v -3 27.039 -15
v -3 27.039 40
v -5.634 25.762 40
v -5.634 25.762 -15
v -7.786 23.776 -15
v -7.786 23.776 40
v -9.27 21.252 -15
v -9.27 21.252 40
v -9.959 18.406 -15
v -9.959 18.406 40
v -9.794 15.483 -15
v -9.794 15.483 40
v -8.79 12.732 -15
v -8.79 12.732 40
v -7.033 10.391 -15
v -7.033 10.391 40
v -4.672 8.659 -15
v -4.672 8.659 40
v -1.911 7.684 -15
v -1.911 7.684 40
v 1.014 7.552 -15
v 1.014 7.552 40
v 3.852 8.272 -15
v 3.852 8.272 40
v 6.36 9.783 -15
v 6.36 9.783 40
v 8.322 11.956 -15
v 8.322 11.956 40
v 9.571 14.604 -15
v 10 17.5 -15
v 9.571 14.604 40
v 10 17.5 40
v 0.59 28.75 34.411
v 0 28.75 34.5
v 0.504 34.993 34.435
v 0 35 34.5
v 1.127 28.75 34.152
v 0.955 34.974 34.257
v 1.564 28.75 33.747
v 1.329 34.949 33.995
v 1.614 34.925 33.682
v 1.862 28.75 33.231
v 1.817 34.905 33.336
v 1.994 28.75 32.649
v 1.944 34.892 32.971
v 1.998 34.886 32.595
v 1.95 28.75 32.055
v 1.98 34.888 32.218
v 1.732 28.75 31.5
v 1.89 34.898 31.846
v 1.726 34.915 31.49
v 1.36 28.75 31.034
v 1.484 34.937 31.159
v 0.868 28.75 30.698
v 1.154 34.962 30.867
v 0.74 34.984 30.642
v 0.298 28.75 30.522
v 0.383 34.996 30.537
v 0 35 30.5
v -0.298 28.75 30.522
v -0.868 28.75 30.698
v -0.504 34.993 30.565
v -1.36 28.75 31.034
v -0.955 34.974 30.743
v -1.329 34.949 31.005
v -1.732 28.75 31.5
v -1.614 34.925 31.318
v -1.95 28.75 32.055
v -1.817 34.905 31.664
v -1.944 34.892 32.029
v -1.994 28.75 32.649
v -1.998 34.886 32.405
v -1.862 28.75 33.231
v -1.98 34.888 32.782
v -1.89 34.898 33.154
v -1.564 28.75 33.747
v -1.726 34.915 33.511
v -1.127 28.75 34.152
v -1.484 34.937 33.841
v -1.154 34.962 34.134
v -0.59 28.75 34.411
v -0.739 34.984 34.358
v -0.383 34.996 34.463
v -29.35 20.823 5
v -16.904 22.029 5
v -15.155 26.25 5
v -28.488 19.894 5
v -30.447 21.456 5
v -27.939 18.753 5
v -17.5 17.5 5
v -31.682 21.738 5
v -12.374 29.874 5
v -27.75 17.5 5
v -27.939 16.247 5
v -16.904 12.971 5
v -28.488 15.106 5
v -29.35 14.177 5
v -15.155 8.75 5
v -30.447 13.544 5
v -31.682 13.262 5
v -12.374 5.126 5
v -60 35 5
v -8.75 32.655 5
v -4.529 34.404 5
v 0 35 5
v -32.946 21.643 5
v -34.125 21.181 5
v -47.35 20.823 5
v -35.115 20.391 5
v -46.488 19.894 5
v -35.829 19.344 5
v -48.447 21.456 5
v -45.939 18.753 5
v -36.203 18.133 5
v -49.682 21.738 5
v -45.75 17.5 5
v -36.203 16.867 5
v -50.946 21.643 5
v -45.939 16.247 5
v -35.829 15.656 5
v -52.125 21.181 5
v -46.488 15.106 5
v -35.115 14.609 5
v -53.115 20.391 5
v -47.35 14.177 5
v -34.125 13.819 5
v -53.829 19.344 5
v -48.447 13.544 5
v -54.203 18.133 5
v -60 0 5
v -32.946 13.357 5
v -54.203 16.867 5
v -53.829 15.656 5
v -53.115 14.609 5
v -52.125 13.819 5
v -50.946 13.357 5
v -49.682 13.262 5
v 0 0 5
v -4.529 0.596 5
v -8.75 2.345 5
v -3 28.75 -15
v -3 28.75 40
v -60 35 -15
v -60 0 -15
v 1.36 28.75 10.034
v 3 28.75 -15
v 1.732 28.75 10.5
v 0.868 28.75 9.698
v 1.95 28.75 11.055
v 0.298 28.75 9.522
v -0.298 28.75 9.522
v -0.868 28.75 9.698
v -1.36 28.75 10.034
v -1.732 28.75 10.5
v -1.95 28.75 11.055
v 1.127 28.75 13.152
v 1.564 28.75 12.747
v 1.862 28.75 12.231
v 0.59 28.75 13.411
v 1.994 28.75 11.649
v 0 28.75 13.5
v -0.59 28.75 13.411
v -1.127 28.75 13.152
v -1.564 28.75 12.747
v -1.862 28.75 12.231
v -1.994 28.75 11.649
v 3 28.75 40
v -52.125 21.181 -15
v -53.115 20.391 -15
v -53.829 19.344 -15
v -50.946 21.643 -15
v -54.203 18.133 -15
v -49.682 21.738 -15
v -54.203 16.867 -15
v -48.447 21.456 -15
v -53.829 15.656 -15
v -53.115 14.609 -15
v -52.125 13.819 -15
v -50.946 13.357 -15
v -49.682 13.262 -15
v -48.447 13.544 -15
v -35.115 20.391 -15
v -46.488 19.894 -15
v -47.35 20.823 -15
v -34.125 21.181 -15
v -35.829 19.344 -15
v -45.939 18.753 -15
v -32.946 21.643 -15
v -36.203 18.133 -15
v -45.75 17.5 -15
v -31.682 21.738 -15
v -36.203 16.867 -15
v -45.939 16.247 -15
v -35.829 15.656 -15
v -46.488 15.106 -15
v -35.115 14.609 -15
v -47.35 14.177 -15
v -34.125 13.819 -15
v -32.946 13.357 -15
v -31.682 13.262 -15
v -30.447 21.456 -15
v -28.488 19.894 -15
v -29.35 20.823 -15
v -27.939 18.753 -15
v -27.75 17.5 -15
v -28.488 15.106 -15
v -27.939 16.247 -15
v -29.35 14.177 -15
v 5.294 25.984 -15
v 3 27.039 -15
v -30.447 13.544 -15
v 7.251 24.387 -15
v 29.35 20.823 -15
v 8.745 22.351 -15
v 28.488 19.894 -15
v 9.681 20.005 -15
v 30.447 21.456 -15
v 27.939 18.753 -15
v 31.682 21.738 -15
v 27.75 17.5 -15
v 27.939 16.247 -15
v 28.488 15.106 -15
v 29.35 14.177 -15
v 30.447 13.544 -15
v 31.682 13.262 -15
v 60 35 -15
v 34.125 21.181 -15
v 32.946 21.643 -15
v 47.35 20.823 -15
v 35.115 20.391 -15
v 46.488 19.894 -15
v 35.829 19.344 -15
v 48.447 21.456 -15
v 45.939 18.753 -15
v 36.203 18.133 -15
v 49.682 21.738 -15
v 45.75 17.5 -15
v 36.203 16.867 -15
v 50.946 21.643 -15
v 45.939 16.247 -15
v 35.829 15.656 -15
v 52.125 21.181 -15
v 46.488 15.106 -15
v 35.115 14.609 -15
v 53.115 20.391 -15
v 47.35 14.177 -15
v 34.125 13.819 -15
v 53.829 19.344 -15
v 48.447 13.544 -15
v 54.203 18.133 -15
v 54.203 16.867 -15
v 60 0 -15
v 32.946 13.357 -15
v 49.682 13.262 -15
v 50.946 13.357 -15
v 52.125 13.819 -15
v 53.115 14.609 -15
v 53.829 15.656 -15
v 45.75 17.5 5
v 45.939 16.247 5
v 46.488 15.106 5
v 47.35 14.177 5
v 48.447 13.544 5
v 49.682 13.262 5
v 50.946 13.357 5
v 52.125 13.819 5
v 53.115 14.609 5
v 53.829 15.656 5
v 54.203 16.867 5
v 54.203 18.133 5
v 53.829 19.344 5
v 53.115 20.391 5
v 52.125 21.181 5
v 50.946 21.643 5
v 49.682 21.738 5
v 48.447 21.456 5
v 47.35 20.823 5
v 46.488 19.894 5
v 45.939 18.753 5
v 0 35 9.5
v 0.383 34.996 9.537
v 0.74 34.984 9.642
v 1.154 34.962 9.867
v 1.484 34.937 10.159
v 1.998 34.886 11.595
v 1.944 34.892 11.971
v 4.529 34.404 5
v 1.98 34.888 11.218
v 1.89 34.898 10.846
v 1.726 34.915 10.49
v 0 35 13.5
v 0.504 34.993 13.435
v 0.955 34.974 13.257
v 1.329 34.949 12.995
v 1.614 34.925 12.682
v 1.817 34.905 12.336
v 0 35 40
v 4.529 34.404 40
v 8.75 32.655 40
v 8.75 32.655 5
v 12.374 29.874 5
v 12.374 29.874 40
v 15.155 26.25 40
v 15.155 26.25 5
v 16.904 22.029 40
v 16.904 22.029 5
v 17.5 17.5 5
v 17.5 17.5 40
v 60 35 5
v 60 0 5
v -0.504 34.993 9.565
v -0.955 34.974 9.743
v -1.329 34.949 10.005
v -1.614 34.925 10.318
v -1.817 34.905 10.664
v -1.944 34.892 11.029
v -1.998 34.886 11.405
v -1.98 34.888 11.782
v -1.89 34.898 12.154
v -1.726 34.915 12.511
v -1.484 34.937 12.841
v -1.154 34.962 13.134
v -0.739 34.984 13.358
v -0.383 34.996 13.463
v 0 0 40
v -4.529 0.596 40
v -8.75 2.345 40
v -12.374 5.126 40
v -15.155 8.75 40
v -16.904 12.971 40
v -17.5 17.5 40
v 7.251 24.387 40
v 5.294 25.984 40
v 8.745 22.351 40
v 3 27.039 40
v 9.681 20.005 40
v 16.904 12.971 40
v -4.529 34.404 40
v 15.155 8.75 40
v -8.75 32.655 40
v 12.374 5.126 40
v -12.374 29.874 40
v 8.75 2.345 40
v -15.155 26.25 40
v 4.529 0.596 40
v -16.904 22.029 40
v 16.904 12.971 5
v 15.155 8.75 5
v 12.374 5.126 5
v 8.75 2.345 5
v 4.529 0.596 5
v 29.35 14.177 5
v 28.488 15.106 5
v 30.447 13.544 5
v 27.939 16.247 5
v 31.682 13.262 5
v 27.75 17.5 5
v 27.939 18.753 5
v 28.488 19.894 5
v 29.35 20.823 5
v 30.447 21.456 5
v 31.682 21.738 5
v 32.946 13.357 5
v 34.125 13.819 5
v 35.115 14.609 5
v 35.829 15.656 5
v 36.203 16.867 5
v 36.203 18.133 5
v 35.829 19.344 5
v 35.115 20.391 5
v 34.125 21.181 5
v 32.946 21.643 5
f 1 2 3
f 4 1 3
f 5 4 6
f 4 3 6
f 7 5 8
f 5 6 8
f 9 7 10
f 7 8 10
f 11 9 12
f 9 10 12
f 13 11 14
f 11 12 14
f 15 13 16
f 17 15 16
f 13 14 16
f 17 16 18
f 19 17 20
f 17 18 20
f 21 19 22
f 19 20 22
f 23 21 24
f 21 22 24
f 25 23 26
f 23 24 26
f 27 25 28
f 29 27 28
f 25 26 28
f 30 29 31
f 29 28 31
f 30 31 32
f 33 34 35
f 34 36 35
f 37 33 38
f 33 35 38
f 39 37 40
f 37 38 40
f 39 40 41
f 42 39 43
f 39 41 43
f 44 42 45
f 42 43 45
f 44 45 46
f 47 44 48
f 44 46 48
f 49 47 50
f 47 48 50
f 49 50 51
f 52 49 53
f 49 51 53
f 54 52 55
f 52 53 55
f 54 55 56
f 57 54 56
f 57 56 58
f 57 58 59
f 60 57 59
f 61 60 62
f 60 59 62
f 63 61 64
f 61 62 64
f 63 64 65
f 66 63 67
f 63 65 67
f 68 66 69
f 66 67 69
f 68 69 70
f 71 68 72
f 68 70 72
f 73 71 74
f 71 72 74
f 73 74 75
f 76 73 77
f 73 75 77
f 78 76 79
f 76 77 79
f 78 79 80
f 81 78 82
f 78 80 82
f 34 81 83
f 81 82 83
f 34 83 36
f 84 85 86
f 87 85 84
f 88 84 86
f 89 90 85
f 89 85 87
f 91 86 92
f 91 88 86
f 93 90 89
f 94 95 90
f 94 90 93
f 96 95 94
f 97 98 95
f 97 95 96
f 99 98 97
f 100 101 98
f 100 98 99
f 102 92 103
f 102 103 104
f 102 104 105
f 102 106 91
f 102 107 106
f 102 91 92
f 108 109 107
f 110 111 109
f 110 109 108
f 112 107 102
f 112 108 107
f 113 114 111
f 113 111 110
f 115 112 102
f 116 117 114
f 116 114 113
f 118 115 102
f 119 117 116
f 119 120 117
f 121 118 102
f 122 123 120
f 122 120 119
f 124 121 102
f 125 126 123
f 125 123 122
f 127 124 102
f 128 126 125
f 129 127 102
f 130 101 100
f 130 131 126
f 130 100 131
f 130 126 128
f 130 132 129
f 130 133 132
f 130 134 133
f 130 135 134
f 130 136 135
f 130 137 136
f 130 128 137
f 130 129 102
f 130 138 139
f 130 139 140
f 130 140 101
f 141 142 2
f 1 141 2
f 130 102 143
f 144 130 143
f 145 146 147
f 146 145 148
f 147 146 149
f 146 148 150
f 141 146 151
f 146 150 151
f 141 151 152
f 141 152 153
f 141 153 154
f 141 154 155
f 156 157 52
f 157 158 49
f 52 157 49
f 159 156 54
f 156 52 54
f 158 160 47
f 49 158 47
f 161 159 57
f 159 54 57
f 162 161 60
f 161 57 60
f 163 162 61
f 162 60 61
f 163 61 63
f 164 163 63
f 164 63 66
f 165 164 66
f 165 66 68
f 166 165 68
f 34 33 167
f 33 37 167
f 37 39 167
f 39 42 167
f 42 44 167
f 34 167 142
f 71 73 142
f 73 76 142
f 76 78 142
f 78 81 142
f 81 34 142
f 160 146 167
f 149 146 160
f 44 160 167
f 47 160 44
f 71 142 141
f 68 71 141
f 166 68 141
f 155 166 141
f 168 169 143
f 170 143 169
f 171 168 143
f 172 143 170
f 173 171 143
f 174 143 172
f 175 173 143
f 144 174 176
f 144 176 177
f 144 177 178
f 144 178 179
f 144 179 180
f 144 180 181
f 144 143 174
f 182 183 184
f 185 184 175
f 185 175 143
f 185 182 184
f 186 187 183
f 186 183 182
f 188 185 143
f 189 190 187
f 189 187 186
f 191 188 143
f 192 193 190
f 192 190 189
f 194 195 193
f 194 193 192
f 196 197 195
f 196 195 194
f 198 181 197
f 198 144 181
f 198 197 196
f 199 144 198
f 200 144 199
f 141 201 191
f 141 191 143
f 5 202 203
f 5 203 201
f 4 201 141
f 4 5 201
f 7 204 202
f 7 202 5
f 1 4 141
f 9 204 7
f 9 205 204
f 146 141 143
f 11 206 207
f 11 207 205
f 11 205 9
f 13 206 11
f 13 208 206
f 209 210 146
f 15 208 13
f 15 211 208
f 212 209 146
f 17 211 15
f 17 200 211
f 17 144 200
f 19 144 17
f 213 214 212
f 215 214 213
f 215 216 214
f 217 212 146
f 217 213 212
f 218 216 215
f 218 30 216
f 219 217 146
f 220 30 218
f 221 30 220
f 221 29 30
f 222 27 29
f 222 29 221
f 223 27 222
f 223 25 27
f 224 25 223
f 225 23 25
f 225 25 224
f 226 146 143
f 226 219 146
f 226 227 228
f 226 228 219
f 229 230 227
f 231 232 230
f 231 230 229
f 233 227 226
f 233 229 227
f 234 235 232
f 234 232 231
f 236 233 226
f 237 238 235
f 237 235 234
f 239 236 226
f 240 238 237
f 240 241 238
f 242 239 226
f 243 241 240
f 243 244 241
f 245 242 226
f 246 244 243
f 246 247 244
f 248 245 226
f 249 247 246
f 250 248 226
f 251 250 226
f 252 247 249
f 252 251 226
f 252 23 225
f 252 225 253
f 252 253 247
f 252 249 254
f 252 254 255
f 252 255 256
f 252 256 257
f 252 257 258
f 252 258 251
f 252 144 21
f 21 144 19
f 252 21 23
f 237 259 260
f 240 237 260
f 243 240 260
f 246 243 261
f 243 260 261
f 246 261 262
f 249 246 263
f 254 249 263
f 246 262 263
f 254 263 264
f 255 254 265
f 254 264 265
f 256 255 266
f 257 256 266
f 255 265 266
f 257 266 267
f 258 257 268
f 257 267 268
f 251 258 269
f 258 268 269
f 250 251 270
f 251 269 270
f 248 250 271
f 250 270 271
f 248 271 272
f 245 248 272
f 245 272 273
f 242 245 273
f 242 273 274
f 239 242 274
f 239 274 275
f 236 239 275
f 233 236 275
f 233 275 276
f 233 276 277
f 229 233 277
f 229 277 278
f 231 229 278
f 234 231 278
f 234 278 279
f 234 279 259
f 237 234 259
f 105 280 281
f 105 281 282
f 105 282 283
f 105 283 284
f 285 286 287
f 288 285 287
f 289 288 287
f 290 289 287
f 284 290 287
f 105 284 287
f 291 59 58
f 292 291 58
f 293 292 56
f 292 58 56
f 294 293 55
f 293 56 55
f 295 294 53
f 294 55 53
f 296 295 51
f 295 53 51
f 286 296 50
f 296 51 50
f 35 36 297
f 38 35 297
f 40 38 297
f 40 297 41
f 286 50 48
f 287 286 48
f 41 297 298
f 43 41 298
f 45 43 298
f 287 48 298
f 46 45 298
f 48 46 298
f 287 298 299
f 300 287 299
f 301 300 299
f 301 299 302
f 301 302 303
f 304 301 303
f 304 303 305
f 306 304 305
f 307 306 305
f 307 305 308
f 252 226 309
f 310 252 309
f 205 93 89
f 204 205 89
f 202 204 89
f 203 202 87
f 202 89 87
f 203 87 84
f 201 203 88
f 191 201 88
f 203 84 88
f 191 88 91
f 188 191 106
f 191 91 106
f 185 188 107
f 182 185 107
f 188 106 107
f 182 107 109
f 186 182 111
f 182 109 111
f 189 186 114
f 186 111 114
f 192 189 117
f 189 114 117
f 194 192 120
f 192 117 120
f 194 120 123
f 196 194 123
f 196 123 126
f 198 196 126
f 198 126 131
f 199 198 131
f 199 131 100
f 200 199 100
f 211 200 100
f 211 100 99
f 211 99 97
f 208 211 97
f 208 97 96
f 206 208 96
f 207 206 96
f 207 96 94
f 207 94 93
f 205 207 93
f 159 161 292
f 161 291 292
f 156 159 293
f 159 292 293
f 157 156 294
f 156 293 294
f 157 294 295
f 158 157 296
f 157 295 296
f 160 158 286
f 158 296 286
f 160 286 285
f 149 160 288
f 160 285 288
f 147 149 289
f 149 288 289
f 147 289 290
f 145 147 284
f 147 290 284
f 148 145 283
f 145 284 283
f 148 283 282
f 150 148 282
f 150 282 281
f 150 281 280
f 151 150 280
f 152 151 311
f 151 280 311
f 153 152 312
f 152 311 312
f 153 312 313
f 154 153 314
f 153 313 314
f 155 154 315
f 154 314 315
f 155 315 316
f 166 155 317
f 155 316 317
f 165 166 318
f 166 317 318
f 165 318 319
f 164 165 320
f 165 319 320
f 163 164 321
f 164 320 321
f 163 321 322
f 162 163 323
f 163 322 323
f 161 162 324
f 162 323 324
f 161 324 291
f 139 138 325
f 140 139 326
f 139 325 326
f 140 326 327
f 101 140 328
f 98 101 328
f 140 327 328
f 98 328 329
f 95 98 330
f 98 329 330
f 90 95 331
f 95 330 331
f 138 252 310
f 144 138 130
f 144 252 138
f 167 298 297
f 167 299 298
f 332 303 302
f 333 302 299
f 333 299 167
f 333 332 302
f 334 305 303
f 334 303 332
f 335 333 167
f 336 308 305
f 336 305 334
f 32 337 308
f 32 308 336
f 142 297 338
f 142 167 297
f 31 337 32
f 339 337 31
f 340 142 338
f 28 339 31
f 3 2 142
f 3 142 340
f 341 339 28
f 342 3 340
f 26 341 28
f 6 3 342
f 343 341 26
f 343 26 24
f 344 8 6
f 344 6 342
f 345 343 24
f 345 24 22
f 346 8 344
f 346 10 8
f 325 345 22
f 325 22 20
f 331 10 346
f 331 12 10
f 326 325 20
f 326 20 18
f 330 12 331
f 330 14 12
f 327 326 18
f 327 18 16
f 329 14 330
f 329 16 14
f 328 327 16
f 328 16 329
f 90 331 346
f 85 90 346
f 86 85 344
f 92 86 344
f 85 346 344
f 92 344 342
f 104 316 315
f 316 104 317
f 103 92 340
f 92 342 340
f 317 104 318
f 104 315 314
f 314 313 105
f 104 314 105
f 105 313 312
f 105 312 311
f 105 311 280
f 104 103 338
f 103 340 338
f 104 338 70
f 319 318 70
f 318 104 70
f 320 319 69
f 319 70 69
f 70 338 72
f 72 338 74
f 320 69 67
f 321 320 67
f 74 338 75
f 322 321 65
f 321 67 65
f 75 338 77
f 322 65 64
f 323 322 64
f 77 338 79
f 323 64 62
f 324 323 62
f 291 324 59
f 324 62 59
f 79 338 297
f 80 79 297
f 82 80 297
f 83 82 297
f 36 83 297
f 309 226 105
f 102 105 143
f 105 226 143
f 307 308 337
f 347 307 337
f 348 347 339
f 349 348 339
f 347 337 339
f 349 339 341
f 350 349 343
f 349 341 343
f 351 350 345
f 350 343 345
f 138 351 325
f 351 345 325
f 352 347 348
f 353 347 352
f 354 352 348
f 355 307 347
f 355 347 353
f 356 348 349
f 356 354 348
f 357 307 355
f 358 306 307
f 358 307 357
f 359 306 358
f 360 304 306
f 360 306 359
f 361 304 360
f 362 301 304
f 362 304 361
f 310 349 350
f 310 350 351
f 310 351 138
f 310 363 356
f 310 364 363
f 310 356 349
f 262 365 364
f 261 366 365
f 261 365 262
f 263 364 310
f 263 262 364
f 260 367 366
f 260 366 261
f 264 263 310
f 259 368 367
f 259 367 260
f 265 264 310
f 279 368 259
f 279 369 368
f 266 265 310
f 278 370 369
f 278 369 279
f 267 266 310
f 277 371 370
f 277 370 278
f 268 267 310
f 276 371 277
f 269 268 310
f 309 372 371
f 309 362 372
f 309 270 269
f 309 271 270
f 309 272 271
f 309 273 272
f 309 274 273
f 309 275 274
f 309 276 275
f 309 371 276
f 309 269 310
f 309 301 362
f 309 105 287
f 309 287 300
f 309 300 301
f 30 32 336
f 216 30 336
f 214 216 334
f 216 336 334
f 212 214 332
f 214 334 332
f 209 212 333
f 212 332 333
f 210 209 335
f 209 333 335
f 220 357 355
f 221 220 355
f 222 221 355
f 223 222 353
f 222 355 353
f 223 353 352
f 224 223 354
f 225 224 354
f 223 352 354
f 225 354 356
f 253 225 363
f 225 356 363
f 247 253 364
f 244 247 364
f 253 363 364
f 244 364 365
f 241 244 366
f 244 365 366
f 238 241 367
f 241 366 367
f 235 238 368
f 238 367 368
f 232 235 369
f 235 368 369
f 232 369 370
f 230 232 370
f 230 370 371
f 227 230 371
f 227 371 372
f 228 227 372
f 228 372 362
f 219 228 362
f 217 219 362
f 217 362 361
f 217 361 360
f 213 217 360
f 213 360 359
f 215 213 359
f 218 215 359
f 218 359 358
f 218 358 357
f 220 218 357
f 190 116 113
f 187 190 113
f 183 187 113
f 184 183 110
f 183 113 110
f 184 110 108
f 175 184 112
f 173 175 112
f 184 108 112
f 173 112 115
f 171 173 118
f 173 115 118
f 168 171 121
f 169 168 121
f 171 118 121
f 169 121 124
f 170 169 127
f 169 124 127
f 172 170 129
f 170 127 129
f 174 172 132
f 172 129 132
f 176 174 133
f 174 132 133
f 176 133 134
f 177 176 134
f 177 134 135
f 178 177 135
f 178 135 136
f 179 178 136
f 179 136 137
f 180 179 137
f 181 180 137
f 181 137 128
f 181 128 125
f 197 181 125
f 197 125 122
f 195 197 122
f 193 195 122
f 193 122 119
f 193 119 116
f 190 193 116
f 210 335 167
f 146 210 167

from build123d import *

# Parameters (mm, degrees)
BOSS_EXTRUDE1_DEPTH = 35
CUT_EXTRUDE1_DEPTH  = 89.600225733
SKETCH3_R           = 4.25
CUT_EXTRUDE2_DEPTH  = 78.781745931
CUT_EXTRUDE6_DEPTH  = 35
CUT_EXTRUDE7_REACH  = 82.156
SKETCH5_R           = 2


with BuildPart() as part:
    # Sketch1 → Boss-Extrude1 (new body)
    with BuildSketch(Plane(origin=(0, 0, 0), x_dir=(1, 0, 0), z_dir=(0, 1, 0))):
        Polygon((-60, 15), (60, 15), (60, -5), (17.5, -5), (17.5, -40), (-17.5, -40), (-17.5, -5), (-60, -5), align=None)
    extrude(amount=BOSS_EXTRUDE1_DEPTH)

    # Sketch2 → Cut-Extrude1 (cut, through all)
    with BuildSketch(Plane.XY.offset(40)):
        with BuildLine():
            Line((3, 28.75), (-3, 28.75))
            Line((-3, 28.75), (-3, 27.039392014))
            ThreePointArc((-3, 27.039392014), (0, 27.5), (3, 27.039392014))
            Line((3, 27.039392014), (3, 28.75))
        make_face()
        with BuildLine():
            ThreePointArc((3, 27.039392014), (0, 27.5), (-3, 27.039392014))
            Line((-3, 27.039392014), (3, 27.039392014))
        make_face()
        with BuildLine():
            Line((3, 27.039392014), (-3, 27.039392014))
            ThreePointArc((-3, 27.039392014), (-5.916079783, 9.437742252), (10, 17.5))
            ThreePointArc((10, 17.5), (8.062257748, 23.416079783), (3, 27.039392014))
        make_face()
    extrude(amount=-CUT_EXTRUDE1_DEPTH, mode=Mode.SUBTRACT)

    # Sketch3 → Cut-Extrude2 (cut, through all)
    with BuildSketch(Plane.XY.offset(5)):
        with Locations((-50, 17.5)):
            Circle(SKETCH3_R)
        with Locations((-32, 17.5)):
            Circle(SKETCH3_R)
        with Locations(Location((32, 17.5, 0), (0, 0, 180))):
            Circle(SKETCH3_R)
        with Locations(Location((50, 17.5, 0), (0, 0, 180))):
            Circle(SKETCH3_R)
    extrude(amount=-CUT_EXTRUDE2_DEPTH, mode=Mode.SUBTRACT)

    # Sketch4 → Cut-Extrude6 (cut)
    with BuildSketch(Plane.XY.offset(40)):
        with BuildLine():
            Line((0, 35), (-17.5, 35))
            Line((-17.5, 35), (-17.5, 17.5))
            ThreePointArc((-17.5, 17.5), (-12.374368671, 29.874368671), (0, 35))
        make_face()
        with BuildLine():
            Line((17.5, 35), (0, 35))
            ThreePointArc((0, 35), (12.374368671, 29.874368671), (17.5, 17.5))
            Line((17.5, 17.5), (17.5, 35))
        make_face()
        with BuildLine():
            Line((17.5, 0), (17.5, 17.5))
            ThreePointArc((17.5, 17.5), (12.374368681, 5.12563134), (3e-08, 0))
            Line((3e-08, 0), (17.5, 0))
        make_face()
        with BuildLine():
            ThreePointArc((3e-08, 0), (-12.37436866, 5.125631319), (-17.5, 17.5))
            Line((-17.5, 17.5), (-17.5, 0))
            Line((-17.5, 0), (3e-08, 0))
        make_face()
    extrude(amount=-CUT_EXTRUDE6_DEPTH, mode=Mode.SUBTRACT)

    # Sketch5 → Cut-Extrude7 (cut, up to next)
    with BuildSketch(Plane(origin=(0, 35, 0), x_dir=(1, 0, 0), z_dir=(0, 1, 0)), mode=Mode.PRIVATE) as cut_extrude7_sk1:
        with Locations(Location((0, -32.5, 0), (0, 0, 270))):
            Circle(SKETCH5_R)
    cut_extrude7_tool1 = extrude(cut_extrude7_sk1.sketch, amount=-CUT_EXTRUDE7_REACH, mode=Mode.PRIVATE) & part.part
    # Sketch5 → Cut-Extrude7 (cut, up to next)
    with BuildSketch(Plane(origin=(0, 35, 0), x_dir=(1, 0, 0), z_dir=(0, 1, 0)), mode=Mode.PRIVATE) as cut_extrude7_sk2:
        with Locations(Location((0, -11.5, 0), (0, 0, 270))):
            Circle(SKETCH5_R)
    cut_extrude7_tool2 = extrude(cut_extrude7_sk2.sketch, amount=-CUT_EXTRUDE7_REACH, mode=Mode.PRIVATE) & part.part
    add(cut_extrude7_tool1.solids().sort_by_distance((0, 35, 32.5))[0], mode=Mode.SUBTRACT)
    add(cut_extrude7_tool2.solids().sort_by_distance((0, 35, 11.5))[0], mode=Mode.SUBTRACT)


solid = part.part
